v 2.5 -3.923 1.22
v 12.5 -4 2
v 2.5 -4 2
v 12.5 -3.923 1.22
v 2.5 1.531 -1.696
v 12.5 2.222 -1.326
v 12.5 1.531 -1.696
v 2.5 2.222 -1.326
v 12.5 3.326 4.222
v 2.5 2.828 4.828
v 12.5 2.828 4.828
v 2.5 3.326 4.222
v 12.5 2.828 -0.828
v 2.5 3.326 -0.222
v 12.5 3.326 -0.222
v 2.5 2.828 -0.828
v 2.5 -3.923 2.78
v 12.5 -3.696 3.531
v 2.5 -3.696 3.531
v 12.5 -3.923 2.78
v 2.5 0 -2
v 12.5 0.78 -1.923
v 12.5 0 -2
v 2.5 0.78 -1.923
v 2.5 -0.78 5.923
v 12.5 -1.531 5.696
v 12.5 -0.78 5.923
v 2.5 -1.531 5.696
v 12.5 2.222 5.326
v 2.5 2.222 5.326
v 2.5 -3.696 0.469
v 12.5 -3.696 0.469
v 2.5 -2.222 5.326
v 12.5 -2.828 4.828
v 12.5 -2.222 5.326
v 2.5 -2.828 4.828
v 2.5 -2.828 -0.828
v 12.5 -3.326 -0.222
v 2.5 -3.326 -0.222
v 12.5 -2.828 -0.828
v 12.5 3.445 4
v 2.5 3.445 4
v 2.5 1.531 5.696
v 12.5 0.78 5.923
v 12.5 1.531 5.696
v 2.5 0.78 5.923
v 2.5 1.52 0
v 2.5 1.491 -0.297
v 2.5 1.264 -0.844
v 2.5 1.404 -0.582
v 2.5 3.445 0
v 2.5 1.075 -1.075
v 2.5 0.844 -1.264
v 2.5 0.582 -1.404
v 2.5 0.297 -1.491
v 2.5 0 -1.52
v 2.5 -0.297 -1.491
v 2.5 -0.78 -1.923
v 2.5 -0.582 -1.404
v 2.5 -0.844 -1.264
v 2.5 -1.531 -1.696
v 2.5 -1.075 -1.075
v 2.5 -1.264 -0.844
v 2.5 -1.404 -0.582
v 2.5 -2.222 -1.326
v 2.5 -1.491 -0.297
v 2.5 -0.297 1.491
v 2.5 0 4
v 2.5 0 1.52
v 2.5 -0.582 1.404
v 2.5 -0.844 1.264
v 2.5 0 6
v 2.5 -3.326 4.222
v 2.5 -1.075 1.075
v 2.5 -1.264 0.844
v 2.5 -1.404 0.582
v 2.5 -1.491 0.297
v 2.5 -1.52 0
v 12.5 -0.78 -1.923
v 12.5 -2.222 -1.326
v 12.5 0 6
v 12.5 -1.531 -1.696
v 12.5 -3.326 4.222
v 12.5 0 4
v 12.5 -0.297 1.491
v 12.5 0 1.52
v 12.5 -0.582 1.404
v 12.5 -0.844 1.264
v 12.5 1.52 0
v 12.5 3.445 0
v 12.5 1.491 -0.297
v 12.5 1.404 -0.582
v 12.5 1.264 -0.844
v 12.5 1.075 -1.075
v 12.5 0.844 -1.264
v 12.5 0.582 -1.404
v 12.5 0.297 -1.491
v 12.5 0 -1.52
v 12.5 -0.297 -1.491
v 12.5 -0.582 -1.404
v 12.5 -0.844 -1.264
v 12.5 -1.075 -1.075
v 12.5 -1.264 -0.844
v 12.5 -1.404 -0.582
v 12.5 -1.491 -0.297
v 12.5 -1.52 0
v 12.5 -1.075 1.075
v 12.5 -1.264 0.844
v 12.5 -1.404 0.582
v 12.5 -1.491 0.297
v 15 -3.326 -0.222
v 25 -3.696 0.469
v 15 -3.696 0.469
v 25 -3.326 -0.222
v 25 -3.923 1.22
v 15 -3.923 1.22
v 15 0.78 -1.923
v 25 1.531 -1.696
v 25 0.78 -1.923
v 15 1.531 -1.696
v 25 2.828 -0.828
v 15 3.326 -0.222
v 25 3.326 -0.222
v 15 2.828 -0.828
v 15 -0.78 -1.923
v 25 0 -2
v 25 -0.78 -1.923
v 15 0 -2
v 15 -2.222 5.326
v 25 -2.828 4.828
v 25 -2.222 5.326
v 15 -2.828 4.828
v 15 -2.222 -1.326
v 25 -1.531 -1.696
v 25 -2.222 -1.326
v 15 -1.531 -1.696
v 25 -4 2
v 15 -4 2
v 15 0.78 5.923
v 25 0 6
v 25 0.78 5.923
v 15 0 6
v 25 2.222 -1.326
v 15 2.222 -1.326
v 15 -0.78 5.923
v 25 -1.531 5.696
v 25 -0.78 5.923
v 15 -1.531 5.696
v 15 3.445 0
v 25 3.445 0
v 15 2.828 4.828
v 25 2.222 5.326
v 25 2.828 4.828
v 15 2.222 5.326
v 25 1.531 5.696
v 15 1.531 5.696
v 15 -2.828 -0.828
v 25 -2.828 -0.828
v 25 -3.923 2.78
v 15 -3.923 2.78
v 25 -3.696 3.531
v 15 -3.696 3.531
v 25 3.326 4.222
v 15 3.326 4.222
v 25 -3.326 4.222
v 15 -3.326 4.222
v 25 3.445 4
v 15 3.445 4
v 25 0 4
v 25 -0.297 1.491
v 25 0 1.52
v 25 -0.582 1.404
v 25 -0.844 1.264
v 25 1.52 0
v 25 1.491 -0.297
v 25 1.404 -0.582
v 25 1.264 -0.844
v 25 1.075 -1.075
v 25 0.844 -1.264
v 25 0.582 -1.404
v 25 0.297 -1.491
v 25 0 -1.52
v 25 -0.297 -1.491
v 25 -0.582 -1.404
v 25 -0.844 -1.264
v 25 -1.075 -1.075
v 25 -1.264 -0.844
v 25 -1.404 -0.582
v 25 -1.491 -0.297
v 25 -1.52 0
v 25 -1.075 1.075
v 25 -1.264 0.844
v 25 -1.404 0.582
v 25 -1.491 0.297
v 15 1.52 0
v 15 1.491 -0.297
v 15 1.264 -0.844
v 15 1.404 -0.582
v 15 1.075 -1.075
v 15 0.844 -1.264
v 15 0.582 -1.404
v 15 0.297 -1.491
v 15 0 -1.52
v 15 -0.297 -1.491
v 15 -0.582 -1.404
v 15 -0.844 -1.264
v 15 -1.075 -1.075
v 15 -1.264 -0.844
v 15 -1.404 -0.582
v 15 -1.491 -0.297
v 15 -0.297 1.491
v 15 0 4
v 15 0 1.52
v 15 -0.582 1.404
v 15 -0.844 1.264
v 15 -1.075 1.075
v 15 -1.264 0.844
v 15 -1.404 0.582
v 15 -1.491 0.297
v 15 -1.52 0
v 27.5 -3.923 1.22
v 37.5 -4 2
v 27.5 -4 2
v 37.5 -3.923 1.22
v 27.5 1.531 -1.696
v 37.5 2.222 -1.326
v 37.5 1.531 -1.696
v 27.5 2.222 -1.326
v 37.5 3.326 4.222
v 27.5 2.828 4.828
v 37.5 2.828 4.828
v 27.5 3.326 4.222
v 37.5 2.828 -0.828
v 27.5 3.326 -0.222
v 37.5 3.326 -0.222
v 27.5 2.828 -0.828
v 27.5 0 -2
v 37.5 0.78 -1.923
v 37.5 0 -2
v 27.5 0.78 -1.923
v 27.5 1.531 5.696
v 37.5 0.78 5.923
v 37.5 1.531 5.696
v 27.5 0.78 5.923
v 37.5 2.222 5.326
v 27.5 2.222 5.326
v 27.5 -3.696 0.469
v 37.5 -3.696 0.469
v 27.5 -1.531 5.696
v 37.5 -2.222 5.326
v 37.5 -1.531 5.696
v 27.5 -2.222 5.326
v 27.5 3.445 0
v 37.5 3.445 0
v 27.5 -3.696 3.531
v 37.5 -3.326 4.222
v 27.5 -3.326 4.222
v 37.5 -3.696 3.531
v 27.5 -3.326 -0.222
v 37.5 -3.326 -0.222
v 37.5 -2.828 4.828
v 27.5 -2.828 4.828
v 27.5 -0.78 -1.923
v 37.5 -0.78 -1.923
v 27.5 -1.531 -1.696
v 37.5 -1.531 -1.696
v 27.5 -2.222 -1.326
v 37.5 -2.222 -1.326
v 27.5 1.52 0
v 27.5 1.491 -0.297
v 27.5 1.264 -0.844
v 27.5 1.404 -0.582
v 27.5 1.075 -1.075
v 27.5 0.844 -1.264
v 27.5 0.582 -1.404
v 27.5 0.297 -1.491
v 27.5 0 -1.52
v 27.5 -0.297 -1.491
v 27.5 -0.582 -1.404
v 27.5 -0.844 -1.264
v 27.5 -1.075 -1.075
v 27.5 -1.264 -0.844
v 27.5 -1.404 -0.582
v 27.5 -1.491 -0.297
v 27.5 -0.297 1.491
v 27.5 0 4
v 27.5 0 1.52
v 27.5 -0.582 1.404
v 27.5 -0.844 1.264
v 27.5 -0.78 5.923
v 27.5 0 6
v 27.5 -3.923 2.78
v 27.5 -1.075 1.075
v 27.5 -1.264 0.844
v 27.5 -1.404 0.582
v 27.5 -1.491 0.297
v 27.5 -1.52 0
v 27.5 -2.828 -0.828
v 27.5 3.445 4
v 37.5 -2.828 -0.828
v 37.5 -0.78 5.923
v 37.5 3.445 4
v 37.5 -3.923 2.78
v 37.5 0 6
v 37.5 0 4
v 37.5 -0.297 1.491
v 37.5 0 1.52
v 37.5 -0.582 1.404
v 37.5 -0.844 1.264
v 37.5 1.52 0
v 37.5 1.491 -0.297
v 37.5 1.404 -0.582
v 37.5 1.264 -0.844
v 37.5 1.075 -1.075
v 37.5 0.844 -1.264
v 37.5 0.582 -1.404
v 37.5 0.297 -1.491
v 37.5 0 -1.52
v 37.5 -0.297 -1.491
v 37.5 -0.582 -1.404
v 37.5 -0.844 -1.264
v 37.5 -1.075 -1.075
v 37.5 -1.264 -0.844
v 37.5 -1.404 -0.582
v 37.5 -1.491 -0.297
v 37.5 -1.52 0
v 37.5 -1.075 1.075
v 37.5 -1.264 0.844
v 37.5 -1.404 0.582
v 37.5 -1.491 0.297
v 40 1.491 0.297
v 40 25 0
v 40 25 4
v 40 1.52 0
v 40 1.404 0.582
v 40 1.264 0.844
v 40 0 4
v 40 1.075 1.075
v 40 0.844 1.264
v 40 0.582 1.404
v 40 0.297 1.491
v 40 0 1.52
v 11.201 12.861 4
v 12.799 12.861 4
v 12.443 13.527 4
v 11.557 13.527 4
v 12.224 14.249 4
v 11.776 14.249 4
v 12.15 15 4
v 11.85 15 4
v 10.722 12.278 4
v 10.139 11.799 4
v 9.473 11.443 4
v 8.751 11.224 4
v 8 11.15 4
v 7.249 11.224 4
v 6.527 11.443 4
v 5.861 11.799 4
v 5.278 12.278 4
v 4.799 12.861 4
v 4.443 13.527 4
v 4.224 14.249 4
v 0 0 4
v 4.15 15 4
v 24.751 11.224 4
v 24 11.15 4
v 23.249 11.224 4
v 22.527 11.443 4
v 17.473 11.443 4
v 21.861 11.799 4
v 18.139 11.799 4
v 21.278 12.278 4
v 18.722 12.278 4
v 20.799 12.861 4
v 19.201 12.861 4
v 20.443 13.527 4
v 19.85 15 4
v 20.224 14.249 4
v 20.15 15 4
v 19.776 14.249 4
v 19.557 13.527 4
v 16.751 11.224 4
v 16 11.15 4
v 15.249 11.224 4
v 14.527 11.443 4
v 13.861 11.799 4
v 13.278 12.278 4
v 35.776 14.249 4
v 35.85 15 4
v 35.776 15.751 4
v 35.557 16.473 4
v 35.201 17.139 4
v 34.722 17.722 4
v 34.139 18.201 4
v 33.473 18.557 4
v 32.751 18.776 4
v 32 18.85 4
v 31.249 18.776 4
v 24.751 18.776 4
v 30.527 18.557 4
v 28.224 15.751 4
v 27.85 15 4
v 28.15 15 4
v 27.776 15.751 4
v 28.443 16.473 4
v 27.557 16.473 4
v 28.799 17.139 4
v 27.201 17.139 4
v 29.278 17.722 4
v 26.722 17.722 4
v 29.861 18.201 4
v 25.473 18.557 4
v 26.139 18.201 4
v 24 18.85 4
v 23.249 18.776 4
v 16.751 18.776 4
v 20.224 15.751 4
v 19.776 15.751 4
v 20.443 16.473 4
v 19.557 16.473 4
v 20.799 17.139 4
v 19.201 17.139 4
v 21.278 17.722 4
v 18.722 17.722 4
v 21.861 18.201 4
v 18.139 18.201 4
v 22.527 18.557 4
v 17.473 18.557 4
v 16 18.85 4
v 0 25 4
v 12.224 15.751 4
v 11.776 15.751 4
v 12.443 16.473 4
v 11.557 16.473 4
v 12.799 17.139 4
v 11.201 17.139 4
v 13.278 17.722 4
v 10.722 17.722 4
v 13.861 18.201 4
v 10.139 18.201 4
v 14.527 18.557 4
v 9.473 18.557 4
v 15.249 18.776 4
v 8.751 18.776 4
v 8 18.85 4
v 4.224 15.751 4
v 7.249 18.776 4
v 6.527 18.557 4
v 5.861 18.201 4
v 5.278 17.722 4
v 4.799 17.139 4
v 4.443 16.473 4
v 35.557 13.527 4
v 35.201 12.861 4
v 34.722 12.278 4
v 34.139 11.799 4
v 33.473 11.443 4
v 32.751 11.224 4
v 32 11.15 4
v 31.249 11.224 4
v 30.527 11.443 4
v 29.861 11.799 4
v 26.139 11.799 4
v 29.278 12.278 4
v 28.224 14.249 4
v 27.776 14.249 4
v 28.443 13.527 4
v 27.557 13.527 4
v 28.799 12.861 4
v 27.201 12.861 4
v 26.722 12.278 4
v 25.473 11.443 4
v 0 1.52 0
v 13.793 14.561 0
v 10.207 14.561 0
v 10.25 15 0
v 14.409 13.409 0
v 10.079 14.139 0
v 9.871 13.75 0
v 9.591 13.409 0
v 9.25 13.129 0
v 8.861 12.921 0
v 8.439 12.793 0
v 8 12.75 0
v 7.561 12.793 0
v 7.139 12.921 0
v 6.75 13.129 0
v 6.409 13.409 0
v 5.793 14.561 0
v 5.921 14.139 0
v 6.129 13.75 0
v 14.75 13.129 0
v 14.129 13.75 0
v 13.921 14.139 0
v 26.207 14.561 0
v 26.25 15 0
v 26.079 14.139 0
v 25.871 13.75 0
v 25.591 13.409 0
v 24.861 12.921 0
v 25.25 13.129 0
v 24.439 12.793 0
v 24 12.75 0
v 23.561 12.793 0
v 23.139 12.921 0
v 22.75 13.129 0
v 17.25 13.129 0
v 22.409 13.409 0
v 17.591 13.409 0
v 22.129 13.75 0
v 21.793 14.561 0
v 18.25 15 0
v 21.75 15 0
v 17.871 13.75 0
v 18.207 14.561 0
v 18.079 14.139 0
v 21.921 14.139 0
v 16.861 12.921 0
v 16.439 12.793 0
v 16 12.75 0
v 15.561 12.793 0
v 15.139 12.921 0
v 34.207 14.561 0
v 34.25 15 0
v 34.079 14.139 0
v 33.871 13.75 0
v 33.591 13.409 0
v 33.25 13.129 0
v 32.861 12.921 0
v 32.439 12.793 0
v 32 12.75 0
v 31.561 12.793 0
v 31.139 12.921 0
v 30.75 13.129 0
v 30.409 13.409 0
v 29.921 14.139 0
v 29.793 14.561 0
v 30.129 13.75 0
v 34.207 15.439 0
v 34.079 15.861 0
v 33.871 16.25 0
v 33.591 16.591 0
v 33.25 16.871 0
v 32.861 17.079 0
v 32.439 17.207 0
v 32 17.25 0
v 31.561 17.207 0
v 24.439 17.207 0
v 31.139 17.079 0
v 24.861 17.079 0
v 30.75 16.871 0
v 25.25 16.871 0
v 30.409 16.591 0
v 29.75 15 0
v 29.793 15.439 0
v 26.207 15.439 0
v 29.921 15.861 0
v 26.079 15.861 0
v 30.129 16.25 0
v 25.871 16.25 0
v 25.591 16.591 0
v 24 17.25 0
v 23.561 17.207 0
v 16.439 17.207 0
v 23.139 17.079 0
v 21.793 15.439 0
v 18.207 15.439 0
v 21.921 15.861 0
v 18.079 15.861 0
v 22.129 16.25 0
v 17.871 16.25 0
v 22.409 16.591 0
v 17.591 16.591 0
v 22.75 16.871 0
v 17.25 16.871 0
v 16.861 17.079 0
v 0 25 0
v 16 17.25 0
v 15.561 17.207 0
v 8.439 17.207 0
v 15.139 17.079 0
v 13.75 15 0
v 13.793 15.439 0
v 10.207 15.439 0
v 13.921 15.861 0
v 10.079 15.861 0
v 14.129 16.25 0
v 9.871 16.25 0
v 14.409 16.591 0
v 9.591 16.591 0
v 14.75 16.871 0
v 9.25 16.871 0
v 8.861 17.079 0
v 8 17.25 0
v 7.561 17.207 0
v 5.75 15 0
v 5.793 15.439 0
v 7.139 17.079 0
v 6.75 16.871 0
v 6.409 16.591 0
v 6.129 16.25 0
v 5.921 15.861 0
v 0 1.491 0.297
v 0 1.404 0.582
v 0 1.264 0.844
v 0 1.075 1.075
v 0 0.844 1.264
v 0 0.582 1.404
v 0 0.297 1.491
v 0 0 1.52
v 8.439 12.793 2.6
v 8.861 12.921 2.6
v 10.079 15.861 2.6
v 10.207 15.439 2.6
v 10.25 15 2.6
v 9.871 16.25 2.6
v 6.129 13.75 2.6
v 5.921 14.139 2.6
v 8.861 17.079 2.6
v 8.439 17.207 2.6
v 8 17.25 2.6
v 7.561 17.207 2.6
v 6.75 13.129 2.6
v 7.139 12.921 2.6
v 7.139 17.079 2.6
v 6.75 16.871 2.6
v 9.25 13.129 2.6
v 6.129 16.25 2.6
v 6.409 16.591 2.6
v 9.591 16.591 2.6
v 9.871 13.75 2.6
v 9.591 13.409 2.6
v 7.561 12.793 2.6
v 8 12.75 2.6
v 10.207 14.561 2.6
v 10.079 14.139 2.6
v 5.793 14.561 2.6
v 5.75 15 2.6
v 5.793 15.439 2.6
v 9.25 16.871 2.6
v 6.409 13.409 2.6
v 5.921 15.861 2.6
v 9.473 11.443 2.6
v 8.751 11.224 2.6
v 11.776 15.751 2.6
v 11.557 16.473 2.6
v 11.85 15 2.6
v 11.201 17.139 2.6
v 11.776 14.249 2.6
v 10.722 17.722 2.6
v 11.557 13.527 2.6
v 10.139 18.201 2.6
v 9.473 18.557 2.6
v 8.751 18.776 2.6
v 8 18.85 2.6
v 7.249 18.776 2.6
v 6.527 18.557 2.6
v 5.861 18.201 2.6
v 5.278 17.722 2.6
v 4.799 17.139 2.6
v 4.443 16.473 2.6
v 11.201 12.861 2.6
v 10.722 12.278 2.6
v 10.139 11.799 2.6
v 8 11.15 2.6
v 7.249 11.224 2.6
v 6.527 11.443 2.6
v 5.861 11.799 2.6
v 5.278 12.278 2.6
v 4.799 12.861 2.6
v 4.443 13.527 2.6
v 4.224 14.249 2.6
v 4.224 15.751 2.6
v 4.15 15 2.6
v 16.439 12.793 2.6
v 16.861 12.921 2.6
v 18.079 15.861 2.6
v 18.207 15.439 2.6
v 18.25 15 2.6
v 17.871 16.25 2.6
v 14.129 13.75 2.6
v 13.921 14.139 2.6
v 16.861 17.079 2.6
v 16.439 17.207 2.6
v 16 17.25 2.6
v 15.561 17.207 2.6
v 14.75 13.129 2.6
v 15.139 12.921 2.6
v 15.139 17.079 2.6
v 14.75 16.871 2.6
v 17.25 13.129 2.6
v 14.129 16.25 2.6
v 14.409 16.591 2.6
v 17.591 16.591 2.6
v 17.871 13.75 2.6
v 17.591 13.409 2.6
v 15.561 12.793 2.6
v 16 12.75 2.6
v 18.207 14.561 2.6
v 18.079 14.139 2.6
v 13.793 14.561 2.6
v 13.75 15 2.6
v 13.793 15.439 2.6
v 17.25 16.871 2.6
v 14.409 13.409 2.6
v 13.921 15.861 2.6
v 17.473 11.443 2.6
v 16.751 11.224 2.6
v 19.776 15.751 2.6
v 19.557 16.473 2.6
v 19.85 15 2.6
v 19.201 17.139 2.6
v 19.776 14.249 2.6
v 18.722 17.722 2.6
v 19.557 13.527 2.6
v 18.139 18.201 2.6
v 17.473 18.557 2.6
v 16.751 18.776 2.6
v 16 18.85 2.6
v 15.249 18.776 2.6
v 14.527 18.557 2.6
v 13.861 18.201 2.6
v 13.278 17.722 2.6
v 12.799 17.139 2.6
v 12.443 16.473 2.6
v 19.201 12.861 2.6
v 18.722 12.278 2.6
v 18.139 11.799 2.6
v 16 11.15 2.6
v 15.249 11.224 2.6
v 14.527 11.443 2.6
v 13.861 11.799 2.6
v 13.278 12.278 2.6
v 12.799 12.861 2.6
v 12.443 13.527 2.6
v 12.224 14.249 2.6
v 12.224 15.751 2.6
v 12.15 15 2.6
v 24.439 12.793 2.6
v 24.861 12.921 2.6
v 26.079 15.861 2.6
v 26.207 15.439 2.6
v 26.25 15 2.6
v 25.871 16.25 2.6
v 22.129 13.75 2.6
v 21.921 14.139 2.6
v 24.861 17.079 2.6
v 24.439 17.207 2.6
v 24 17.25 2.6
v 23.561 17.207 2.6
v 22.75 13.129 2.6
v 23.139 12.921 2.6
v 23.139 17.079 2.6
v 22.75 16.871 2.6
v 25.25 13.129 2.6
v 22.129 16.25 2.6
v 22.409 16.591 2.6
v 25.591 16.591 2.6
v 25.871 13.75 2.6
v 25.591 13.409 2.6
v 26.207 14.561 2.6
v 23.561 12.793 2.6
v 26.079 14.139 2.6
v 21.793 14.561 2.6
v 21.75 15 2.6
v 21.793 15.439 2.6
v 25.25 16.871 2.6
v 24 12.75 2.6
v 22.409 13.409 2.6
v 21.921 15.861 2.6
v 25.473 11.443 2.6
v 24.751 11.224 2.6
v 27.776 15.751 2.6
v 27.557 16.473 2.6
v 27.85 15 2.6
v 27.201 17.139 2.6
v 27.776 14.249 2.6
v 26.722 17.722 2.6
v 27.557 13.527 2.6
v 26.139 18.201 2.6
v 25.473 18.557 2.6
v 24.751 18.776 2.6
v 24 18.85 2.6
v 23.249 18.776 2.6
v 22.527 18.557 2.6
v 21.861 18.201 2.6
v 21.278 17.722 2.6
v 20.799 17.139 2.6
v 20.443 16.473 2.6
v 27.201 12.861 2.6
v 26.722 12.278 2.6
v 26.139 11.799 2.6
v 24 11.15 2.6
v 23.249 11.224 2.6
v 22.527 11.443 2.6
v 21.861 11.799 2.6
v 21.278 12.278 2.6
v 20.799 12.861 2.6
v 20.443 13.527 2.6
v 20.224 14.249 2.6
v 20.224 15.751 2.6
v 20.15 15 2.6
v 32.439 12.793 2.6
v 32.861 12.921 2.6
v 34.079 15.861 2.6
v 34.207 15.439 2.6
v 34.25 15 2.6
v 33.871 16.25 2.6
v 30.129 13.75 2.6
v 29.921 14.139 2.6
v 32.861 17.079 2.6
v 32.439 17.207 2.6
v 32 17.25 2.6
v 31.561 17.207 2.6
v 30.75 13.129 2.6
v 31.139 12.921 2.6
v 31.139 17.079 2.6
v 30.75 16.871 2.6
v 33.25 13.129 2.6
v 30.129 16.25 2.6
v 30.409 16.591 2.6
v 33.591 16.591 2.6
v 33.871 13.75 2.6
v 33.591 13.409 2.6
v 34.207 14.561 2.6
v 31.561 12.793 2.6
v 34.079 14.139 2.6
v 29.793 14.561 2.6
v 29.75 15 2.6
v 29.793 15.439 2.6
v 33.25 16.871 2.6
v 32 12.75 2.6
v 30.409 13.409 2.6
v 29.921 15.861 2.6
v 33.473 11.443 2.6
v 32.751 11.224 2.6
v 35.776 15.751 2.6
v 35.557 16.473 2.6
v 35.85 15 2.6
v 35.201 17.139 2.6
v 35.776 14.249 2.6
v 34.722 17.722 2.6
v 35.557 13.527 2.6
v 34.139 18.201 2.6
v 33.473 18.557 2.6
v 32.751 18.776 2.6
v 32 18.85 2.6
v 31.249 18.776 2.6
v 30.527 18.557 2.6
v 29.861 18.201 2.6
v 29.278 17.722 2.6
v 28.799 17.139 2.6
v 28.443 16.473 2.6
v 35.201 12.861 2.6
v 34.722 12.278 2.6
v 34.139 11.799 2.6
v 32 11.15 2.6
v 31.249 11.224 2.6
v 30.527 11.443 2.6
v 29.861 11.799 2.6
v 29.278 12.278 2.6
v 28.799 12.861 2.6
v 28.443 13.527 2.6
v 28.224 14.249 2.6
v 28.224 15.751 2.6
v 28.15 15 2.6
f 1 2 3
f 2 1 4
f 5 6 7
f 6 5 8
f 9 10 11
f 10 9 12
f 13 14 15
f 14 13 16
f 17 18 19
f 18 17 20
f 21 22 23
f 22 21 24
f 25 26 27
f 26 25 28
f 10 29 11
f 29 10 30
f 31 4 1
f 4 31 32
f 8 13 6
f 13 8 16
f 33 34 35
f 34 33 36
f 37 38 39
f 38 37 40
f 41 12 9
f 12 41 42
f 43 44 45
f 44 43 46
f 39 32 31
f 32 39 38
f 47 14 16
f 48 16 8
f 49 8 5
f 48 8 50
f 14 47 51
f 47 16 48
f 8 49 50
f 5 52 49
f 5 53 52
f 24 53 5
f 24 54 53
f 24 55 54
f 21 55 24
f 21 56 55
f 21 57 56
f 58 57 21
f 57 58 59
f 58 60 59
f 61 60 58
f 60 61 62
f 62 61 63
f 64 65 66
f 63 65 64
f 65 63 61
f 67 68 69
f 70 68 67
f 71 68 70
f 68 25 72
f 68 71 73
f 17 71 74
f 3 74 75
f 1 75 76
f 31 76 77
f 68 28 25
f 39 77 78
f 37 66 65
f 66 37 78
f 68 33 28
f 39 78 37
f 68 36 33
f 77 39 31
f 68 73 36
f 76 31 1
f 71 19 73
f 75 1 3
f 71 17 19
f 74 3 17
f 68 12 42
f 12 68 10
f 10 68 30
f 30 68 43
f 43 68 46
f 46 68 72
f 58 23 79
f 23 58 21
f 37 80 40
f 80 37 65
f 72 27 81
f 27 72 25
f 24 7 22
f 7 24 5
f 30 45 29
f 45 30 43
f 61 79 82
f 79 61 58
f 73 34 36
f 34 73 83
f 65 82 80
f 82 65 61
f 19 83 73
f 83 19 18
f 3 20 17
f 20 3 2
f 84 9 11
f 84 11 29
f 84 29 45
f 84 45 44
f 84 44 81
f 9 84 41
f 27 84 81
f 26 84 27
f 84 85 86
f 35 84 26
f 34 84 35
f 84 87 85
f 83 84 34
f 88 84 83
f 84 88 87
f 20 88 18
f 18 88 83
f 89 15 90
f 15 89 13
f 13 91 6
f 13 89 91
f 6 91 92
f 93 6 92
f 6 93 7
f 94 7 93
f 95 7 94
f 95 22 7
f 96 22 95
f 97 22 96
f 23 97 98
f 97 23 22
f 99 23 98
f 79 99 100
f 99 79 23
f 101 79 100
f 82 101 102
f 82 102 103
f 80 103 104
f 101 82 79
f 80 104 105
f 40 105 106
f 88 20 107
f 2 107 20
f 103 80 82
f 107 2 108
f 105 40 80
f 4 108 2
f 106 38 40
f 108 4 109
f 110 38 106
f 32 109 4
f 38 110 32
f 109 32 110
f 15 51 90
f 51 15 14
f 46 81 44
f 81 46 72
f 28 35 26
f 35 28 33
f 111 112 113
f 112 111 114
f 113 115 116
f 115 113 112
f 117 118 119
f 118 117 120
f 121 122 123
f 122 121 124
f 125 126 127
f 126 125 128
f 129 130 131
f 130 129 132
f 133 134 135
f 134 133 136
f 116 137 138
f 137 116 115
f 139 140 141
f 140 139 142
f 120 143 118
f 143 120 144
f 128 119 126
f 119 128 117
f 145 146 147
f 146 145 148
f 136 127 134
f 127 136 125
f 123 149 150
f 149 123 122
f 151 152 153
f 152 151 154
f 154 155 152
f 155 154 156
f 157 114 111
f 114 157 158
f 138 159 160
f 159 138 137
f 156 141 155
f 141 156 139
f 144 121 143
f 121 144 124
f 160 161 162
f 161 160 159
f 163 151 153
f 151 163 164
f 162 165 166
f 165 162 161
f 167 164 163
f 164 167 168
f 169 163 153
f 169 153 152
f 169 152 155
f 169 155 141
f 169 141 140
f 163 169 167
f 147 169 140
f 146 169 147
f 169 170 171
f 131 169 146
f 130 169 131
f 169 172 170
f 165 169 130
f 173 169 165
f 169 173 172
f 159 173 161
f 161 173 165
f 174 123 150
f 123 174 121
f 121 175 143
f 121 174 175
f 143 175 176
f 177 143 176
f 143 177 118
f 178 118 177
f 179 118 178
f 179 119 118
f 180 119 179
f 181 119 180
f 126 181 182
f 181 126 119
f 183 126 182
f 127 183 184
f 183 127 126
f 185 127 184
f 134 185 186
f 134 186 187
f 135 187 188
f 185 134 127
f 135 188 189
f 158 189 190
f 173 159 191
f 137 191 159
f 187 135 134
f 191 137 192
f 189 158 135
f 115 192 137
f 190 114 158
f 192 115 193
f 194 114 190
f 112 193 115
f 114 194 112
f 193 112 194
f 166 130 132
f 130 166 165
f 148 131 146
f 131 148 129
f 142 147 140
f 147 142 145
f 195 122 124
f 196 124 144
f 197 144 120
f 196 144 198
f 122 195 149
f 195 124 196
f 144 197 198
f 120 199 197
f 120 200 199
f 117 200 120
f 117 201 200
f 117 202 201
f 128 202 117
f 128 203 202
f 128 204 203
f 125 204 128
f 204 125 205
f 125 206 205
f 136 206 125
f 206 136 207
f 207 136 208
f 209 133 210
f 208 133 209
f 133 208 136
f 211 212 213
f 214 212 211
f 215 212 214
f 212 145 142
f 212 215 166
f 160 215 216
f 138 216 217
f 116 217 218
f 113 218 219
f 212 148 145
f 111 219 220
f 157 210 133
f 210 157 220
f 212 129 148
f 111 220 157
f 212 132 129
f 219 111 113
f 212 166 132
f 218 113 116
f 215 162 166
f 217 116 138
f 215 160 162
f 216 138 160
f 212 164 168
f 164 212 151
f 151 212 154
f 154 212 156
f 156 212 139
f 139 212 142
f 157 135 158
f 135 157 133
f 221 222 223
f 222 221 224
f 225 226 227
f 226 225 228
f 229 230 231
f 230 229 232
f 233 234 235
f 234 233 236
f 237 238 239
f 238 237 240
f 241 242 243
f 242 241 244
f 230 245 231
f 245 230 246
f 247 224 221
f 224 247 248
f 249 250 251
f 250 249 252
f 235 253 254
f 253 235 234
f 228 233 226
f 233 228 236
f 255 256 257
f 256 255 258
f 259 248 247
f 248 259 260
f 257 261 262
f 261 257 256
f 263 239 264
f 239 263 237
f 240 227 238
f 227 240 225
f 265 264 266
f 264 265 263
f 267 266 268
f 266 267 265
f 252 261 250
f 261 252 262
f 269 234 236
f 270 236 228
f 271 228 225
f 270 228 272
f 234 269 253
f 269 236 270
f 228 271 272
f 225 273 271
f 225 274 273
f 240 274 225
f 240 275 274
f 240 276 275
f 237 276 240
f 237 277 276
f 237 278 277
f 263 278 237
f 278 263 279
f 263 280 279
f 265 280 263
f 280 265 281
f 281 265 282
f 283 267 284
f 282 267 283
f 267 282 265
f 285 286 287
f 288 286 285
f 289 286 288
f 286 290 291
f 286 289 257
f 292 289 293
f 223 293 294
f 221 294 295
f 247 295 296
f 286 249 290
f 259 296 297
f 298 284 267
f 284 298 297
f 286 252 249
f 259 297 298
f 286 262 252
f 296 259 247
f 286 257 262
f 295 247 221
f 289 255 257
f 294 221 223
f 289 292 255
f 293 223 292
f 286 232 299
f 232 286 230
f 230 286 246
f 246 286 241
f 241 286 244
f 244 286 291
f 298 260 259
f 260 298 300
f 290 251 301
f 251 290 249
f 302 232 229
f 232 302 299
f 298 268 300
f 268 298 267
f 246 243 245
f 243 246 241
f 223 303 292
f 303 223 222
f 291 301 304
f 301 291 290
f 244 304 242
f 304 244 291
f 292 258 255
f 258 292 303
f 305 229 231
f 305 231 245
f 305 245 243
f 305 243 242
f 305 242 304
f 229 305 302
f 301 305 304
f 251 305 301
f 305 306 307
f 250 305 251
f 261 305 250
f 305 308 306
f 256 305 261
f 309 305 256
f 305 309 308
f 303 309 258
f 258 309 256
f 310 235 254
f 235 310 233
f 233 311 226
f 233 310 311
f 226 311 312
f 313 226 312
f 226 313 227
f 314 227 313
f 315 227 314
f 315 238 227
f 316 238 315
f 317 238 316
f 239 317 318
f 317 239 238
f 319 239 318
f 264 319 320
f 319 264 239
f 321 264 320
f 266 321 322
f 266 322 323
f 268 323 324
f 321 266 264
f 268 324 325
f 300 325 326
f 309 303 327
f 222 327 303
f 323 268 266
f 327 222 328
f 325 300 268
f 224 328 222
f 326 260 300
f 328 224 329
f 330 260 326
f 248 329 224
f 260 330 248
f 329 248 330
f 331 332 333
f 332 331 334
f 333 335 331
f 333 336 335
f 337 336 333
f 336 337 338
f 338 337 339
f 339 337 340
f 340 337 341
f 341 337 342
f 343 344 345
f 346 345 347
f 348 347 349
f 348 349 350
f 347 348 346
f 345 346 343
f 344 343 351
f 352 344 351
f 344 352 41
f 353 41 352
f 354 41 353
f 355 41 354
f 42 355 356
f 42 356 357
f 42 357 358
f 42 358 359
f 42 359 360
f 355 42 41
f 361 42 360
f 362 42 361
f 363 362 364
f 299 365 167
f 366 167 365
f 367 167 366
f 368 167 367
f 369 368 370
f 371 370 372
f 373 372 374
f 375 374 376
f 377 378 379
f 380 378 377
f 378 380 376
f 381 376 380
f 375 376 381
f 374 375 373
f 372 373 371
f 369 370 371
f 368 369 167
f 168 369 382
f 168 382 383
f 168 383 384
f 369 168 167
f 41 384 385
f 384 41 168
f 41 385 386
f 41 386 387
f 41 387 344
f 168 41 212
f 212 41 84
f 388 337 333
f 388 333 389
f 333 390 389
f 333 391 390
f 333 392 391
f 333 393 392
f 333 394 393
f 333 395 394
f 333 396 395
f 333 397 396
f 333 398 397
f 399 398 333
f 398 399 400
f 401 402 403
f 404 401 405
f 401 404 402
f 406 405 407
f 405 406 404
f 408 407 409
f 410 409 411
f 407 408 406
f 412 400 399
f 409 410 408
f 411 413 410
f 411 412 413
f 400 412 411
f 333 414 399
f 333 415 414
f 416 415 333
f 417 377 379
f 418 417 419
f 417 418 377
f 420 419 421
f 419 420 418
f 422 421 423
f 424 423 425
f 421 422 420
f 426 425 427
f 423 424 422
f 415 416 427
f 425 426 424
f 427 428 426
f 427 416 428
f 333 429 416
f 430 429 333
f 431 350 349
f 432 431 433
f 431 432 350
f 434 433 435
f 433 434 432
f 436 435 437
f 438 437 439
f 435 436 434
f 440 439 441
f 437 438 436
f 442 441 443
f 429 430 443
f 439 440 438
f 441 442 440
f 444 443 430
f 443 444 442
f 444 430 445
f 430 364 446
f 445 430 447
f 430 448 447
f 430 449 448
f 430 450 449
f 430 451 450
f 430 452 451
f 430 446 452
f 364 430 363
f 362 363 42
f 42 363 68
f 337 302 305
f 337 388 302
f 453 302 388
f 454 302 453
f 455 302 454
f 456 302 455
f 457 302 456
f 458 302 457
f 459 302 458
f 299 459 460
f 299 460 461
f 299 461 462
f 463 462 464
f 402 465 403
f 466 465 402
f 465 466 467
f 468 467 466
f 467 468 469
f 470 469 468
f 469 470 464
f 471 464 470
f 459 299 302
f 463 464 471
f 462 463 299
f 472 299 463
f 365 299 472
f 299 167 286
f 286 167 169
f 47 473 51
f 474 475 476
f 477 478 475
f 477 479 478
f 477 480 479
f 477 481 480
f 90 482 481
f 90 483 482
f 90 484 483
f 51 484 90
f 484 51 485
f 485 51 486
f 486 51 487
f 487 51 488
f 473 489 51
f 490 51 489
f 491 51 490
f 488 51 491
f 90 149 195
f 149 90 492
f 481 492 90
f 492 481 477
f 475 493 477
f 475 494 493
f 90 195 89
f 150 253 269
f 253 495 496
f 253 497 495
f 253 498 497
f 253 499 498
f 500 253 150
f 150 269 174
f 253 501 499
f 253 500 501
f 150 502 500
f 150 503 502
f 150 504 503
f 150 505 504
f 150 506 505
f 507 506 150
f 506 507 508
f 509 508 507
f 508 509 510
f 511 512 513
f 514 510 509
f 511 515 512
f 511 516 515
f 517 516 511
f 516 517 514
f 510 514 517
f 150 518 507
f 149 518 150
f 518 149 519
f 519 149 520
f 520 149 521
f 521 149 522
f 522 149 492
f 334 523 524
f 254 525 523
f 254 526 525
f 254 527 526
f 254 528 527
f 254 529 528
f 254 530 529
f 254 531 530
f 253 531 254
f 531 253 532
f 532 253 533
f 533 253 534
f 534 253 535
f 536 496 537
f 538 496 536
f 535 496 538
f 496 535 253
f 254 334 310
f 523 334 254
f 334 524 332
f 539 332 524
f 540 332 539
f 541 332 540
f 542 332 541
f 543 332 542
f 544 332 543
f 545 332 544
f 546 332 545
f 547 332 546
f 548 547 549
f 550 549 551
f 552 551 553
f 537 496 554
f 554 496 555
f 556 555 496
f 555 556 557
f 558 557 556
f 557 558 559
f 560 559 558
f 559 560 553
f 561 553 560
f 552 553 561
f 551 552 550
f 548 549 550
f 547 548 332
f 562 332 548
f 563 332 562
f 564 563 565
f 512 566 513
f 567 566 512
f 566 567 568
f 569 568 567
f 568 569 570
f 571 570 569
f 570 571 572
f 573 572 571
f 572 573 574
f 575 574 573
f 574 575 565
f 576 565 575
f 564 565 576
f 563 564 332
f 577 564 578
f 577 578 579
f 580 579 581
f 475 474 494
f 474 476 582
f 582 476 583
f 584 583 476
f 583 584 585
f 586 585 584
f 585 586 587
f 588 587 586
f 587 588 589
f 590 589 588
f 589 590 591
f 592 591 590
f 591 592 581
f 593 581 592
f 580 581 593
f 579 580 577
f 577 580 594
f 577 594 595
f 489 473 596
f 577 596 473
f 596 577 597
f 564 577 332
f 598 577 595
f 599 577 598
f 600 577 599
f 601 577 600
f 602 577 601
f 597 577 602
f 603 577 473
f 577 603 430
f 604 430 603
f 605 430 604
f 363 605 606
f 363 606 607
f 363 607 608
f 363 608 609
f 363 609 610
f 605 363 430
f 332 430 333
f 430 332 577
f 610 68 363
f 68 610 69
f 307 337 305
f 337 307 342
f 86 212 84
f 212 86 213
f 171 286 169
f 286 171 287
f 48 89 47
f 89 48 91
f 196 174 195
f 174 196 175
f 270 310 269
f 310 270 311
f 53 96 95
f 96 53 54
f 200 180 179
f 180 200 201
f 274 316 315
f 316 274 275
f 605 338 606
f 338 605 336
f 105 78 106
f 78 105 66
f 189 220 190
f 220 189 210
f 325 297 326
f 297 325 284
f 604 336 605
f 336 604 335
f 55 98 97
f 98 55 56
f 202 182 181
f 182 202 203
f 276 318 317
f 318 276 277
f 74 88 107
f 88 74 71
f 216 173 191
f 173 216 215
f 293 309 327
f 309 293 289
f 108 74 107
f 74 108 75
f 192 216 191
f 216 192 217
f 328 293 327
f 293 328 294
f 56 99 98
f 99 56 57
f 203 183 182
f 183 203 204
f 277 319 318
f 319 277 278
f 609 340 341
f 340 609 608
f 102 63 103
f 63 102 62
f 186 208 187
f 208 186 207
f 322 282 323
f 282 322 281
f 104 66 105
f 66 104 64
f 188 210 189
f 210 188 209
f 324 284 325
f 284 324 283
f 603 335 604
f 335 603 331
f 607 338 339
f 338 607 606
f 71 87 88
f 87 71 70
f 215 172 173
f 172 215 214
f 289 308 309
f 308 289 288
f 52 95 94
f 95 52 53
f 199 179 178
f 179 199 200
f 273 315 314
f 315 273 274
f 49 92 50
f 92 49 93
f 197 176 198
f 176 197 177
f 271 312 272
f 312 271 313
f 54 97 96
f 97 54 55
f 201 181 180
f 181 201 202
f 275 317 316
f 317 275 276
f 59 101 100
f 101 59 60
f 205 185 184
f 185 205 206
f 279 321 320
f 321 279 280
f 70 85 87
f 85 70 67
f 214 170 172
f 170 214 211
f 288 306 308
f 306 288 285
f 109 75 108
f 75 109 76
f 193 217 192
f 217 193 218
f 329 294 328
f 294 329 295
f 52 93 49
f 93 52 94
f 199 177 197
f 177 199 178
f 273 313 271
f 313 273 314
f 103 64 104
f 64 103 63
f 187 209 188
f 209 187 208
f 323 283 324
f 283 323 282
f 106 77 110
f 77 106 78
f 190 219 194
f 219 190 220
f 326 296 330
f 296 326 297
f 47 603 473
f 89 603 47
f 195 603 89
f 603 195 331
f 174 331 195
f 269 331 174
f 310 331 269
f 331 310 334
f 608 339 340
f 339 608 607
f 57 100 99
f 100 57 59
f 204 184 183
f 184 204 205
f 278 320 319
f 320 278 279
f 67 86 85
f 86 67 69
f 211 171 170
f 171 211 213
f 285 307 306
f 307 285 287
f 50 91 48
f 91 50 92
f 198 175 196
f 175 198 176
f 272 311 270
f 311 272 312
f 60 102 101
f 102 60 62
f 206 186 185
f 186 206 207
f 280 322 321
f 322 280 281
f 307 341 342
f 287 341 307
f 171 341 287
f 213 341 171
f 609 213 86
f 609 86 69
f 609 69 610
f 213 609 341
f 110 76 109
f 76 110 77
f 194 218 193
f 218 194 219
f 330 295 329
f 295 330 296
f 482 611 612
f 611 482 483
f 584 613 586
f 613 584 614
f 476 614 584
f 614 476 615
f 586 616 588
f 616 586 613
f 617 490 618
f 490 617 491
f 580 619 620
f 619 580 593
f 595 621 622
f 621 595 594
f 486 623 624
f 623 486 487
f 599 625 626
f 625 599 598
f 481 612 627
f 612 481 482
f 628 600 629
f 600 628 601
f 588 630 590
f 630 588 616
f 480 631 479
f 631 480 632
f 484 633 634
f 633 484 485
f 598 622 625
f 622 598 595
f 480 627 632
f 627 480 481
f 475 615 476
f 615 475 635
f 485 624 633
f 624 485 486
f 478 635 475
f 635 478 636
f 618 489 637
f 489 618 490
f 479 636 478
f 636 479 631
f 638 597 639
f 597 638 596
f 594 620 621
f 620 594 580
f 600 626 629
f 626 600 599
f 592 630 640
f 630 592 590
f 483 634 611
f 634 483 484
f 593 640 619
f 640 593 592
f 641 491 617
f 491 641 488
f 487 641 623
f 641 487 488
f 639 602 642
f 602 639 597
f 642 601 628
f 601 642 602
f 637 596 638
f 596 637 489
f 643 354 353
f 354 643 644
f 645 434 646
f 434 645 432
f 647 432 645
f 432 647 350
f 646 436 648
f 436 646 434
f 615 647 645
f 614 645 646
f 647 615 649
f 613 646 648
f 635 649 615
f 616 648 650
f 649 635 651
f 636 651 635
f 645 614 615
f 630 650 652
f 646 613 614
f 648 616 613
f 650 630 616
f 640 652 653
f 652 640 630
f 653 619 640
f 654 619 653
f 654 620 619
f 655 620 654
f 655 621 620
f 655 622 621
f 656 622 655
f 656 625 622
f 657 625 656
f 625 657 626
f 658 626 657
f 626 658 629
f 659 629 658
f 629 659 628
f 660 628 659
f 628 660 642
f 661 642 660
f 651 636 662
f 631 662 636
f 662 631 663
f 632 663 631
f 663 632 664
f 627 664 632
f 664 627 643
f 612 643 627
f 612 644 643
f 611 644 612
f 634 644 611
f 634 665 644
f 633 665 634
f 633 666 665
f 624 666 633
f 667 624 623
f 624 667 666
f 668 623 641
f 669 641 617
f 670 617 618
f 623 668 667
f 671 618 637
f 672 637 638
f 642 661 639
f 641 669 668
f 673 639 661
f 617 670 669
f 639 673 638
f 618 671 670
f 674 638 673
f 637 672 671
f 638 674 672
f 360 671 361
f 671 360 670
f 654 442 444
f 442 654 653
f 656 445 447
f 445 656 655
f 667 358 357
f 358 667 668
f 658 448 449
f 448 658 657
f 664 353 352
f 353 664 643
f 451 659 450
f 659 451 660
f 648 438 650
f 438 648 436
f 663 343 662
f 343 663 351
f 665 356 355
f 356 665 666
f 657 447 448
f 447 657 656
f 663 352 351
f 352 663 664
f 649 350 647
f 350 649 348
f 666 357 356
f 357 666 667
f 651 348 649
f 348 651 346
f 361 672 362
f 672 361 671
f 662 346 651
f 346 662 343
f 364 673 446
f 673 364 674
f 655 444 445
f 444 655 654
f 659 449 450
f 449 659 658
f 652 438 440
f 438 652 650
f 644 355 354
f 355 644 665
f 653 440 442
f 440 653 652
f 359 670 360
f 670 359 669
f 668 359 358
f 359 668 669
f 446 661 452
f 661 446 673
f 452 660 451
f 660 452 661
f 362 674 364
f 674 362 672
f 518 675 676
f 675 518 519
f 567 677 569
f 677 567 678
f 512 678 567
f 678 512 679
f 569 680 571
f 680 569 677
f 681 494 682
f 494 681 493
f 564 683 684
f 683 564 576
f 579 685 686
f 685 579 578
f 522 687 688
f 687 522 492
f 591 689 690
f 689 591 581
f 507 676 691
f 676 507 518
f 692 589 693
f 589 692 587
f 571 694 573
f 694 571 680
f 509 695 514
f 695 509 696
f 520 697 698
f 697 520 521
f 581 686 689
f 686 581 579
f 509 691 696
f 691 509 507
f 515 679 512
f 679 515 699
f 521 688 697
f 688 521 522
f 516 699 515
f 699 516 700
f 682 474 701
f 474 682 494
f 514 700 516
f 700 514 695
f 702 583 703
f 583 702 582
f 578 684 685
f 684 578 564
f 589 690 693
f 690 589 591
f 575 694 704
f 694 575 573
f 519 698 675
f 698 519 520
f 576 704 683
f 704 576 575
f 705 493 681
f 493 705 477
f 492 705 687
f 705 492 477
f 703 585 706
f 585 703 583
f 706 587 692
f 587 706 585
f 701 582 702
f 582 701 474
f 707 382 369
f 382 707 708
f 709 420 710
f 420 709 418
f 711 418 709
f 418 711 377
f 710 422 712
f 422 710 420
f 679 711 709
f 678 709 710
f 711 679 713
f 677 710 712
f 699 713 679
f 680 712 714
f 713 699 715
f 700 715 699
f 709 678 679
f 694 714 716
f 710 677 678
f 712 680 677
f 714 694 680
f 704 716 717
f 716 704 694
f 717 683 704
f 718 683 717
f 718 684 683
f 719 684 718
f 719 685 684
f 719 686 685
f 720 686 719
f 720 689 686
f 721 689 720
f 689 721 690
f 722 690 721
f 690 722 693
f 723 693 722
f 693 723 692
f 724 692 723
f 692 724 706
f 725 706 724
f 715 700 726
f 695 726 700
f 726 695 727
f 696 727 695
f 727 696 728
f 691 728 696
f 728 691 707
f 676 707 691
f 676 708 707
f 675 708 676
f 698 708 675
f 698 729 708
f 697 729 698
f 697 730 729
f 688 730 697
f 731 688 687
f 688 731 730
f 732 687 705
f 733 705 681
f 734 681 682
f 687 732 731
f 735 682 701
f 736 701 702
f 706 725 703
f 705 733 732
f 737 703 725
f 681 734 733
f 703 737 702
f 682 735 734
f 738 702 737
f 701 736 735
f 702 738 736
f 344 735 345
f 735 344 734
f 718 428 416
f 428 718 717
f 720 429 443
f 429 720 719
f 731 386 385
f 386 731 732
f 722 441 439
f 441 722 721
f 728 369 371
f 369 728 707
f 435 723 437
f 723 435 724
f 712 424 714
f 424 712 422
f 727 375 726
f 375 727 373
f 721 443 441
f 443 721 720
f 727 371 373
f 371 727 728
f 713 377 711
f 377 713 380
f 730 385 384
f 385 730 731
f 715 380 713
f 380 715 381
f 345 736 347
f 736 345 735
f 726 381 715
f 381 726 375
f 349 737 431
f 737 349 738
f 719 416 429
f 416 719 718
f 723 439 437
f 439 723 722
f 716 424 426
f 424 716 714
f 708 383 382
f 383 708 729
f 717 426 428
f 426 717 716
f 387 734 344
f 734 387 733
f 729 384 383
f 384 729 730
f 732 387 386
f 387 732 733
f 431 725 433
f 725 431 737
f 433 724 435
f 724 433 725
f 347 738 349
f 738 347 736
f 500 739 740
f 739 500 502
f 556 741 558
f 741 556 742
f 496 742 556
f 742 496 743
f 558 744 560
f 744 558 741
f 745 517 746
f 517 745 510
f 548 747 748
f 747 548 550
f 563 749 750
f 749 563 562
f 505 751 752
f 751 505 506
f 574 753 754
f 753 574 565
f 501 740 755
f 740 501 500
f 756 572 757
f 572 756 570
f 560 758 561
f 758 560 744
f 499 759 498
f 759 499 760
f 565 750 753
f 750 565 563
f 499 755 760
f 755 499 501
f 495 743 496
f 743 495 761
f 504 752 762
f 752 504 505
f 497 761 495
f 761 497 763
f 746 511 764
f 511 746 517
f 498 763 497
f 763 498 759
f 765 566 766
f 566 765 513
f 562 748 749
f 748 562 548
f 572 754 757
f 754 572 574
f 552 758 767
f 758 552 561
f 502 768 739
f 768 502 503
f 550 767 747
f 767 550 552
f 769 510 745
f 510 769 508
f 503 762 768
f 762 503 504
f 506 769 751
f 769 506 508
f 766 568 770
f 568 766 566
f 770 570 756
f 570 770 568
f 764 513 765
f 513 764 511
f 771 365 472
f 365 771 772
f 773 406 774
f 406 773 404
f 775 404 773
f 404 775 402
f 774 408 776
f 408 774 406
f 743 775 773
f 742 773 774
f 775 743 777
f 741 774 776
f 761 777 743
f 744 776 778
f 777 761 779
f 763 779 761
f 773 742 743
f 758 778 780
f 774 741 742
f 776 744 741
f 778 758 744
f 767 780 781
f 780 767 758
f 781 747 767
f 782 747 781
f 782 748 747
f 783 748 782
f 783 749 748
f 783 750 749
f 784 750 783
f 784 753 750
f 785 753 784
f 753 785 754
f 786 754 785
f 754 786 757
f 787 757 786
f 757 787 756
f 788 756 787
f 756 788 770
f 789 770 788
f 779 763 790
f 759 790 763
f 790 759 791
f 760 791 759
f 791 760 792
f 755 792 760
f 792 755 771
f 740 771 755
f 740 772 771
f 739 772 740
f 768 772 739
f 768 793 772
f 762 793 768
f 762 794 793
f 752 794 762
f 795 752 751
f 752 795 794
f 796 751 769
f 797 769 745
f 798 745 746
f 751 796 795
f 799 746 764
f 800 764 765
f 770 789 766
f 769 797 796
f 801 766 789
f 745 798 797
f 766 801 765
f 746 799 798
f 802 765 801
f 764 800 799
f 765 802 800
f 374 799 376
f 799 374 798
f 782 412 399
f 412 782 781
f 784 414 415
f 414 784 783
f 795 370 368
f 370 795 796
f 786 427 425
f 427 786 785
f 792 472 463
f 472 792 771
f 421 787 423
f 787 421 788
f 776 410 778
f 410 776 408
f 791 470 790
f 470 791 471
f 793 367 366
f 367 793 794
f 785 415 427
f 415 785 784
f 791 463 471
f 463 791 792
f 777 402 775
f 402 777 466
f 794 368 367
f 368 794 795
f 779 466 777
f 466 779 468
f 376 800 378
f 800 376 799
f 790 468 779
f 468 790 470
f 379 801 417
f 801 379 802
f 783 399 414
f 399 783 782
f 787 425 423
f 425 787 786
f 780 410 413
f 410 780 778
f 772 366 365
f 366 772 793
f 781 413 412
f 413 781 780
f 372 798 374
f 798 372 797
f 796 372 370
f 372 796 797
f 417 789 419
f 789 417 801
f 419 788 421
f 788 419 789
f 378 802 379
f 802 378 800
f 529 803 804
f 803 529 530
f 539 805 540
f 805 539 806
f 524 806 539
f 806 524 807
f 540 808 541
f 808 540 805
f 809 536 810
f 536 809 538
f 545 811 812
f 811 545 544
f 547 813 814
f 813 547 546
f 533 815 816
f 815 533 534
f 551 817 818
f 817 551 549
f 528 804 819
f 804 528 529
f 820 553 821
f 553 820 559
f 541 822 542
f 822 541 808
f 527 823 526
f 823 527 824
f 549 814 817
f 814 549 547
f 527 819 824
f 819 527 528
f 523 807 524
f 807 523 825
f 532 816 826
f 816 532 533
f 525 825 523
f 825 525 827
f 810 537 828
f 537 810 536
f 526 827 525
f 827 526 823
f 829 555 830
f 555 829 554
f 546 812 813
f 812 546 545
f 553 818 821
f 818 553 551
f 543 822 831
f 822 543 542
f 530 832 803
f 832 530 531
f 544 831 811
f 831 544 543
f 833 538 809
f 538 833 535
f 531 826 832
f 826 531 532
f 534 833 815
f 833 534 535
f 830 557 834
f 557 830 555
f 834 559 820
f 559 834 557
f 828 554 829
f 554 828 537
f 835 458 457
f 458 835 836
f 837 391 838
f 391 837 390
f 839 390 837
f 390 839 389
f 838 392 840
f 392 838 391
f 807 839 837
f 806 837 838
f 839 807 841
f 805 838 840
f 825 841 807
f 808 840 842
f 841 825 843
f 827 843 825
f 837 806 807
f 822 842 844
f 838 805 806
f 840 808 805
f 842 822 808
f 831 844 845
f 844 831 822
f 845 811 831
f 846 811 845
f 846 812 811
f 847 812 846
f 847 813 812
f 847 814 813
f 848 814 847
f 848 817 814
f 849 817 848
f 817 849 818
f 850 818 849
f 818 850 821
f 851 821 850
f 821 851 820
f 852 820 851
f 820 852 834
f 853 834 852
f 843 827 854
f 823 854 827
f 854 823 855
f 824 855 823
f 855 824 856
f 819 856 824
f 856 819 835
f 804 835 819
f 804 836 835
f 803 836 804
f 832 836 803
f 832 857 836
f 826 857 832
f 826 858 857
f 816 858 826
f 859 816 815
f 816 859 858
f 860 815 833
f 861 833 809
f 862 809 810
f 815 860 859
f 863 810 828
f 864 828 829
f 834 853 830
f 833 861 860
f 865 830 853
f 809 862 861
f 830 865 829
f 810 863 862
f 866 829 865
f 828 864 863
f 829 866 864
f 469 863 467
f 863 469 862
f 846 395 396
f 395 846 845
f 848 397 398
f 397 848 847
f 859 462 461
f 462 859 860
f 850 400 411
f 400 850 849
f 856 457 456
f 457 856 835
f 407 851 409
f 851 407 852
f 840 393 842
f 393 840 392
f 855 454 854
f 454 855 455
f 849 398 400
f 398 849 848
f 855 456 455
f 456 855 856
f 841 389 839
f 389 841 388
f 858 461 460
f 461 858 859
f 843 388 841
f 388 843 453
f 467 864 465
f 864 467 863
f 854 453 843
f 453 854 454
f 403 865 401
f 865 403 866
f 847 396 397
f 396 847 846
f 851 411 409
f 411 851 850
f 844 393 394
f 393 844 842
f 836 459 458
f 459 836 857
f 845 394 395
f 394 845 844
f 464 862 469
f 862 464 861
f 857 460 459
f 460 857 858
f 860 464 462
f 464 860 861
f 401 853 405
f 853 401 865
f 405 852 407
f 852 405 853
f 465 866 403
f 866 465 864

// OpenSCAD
$fn = 32;

// ----------------------------------------------------------------------
// Hinge leaf: 40 x 29 x 8 mm
// ----------------------------------------------------------------------

// --- parameters (mm) ---
plate_len = 40;           // leaf length, X
plate_w = 25;             // leaf width, Y
plate_t = 4;              // leaf thickness
barrel_d = 8;             // knuckle diameter
barrel_w = 10;            // knuckle width
knuckle_n = 3;            // number of knuckles
pin_d = 3.04;             // pin bore
gap = 2.5;                // gap between the knuckles
screw_d = 4.5;            // screw clearance
cs_d = 7.7;               // countersink diameter
cs_h = 1.4;               // countersink depth

module leaf() {
  cube([plate_len, plate_w, plate_t]);
}

module knuckles() {
  /* barrels sit on the leaf edge, the pin axis at half the leaf thickness */
  for (i = [0 : knuckle_n - 1])
    translate([gap + i * (barrel_w + gap), 0, plate_t * 0.5])
      rotate([0, 90, 0]) cylinder(h = barrel_w, d = barrel_d);
}

difference() {
  union() {
    leaf();
    knuckles();
  }
  rotate([0, 90, 0]) translate([0, 0, -1])
    cylinder(h = plate_len + 2, d = pin_d);
  translate([8, plate_w * 0.6, -1]) cylinder(h = plate_t + 2, d = screw_d);
  translate([8, plate_w * 0.6, plate_t - cs_h]) cylinder(h = cs_h + 0.5, d = cs_d);
  translate([16, plate_w * 0.6, -1]) cylinder(h = plate_t + 2, d = screw_d);
  translate([16, plate_w * 0.6, plate_t - cs_h]) cylinder(h = cs_h + 0.5, d = cs_d);
  translate([24, plate_w * 0.6, -1]) cylinder(h = plate_t + 2, d = screw_d);
  translate([24, plate_w * 0.6, plate_t - cs_h]) cylinder(h = cs_h + 0.5, d = cs_d);
  translate([32, plate_w * 0.6, -1]) cylinder(h = plate_t + 2, d = screw_d);
  translate([32, plate_w * 0.6, plate_t - cs_h]) cylinder(h = cs_h + 0.5, d = cs_d);
}
